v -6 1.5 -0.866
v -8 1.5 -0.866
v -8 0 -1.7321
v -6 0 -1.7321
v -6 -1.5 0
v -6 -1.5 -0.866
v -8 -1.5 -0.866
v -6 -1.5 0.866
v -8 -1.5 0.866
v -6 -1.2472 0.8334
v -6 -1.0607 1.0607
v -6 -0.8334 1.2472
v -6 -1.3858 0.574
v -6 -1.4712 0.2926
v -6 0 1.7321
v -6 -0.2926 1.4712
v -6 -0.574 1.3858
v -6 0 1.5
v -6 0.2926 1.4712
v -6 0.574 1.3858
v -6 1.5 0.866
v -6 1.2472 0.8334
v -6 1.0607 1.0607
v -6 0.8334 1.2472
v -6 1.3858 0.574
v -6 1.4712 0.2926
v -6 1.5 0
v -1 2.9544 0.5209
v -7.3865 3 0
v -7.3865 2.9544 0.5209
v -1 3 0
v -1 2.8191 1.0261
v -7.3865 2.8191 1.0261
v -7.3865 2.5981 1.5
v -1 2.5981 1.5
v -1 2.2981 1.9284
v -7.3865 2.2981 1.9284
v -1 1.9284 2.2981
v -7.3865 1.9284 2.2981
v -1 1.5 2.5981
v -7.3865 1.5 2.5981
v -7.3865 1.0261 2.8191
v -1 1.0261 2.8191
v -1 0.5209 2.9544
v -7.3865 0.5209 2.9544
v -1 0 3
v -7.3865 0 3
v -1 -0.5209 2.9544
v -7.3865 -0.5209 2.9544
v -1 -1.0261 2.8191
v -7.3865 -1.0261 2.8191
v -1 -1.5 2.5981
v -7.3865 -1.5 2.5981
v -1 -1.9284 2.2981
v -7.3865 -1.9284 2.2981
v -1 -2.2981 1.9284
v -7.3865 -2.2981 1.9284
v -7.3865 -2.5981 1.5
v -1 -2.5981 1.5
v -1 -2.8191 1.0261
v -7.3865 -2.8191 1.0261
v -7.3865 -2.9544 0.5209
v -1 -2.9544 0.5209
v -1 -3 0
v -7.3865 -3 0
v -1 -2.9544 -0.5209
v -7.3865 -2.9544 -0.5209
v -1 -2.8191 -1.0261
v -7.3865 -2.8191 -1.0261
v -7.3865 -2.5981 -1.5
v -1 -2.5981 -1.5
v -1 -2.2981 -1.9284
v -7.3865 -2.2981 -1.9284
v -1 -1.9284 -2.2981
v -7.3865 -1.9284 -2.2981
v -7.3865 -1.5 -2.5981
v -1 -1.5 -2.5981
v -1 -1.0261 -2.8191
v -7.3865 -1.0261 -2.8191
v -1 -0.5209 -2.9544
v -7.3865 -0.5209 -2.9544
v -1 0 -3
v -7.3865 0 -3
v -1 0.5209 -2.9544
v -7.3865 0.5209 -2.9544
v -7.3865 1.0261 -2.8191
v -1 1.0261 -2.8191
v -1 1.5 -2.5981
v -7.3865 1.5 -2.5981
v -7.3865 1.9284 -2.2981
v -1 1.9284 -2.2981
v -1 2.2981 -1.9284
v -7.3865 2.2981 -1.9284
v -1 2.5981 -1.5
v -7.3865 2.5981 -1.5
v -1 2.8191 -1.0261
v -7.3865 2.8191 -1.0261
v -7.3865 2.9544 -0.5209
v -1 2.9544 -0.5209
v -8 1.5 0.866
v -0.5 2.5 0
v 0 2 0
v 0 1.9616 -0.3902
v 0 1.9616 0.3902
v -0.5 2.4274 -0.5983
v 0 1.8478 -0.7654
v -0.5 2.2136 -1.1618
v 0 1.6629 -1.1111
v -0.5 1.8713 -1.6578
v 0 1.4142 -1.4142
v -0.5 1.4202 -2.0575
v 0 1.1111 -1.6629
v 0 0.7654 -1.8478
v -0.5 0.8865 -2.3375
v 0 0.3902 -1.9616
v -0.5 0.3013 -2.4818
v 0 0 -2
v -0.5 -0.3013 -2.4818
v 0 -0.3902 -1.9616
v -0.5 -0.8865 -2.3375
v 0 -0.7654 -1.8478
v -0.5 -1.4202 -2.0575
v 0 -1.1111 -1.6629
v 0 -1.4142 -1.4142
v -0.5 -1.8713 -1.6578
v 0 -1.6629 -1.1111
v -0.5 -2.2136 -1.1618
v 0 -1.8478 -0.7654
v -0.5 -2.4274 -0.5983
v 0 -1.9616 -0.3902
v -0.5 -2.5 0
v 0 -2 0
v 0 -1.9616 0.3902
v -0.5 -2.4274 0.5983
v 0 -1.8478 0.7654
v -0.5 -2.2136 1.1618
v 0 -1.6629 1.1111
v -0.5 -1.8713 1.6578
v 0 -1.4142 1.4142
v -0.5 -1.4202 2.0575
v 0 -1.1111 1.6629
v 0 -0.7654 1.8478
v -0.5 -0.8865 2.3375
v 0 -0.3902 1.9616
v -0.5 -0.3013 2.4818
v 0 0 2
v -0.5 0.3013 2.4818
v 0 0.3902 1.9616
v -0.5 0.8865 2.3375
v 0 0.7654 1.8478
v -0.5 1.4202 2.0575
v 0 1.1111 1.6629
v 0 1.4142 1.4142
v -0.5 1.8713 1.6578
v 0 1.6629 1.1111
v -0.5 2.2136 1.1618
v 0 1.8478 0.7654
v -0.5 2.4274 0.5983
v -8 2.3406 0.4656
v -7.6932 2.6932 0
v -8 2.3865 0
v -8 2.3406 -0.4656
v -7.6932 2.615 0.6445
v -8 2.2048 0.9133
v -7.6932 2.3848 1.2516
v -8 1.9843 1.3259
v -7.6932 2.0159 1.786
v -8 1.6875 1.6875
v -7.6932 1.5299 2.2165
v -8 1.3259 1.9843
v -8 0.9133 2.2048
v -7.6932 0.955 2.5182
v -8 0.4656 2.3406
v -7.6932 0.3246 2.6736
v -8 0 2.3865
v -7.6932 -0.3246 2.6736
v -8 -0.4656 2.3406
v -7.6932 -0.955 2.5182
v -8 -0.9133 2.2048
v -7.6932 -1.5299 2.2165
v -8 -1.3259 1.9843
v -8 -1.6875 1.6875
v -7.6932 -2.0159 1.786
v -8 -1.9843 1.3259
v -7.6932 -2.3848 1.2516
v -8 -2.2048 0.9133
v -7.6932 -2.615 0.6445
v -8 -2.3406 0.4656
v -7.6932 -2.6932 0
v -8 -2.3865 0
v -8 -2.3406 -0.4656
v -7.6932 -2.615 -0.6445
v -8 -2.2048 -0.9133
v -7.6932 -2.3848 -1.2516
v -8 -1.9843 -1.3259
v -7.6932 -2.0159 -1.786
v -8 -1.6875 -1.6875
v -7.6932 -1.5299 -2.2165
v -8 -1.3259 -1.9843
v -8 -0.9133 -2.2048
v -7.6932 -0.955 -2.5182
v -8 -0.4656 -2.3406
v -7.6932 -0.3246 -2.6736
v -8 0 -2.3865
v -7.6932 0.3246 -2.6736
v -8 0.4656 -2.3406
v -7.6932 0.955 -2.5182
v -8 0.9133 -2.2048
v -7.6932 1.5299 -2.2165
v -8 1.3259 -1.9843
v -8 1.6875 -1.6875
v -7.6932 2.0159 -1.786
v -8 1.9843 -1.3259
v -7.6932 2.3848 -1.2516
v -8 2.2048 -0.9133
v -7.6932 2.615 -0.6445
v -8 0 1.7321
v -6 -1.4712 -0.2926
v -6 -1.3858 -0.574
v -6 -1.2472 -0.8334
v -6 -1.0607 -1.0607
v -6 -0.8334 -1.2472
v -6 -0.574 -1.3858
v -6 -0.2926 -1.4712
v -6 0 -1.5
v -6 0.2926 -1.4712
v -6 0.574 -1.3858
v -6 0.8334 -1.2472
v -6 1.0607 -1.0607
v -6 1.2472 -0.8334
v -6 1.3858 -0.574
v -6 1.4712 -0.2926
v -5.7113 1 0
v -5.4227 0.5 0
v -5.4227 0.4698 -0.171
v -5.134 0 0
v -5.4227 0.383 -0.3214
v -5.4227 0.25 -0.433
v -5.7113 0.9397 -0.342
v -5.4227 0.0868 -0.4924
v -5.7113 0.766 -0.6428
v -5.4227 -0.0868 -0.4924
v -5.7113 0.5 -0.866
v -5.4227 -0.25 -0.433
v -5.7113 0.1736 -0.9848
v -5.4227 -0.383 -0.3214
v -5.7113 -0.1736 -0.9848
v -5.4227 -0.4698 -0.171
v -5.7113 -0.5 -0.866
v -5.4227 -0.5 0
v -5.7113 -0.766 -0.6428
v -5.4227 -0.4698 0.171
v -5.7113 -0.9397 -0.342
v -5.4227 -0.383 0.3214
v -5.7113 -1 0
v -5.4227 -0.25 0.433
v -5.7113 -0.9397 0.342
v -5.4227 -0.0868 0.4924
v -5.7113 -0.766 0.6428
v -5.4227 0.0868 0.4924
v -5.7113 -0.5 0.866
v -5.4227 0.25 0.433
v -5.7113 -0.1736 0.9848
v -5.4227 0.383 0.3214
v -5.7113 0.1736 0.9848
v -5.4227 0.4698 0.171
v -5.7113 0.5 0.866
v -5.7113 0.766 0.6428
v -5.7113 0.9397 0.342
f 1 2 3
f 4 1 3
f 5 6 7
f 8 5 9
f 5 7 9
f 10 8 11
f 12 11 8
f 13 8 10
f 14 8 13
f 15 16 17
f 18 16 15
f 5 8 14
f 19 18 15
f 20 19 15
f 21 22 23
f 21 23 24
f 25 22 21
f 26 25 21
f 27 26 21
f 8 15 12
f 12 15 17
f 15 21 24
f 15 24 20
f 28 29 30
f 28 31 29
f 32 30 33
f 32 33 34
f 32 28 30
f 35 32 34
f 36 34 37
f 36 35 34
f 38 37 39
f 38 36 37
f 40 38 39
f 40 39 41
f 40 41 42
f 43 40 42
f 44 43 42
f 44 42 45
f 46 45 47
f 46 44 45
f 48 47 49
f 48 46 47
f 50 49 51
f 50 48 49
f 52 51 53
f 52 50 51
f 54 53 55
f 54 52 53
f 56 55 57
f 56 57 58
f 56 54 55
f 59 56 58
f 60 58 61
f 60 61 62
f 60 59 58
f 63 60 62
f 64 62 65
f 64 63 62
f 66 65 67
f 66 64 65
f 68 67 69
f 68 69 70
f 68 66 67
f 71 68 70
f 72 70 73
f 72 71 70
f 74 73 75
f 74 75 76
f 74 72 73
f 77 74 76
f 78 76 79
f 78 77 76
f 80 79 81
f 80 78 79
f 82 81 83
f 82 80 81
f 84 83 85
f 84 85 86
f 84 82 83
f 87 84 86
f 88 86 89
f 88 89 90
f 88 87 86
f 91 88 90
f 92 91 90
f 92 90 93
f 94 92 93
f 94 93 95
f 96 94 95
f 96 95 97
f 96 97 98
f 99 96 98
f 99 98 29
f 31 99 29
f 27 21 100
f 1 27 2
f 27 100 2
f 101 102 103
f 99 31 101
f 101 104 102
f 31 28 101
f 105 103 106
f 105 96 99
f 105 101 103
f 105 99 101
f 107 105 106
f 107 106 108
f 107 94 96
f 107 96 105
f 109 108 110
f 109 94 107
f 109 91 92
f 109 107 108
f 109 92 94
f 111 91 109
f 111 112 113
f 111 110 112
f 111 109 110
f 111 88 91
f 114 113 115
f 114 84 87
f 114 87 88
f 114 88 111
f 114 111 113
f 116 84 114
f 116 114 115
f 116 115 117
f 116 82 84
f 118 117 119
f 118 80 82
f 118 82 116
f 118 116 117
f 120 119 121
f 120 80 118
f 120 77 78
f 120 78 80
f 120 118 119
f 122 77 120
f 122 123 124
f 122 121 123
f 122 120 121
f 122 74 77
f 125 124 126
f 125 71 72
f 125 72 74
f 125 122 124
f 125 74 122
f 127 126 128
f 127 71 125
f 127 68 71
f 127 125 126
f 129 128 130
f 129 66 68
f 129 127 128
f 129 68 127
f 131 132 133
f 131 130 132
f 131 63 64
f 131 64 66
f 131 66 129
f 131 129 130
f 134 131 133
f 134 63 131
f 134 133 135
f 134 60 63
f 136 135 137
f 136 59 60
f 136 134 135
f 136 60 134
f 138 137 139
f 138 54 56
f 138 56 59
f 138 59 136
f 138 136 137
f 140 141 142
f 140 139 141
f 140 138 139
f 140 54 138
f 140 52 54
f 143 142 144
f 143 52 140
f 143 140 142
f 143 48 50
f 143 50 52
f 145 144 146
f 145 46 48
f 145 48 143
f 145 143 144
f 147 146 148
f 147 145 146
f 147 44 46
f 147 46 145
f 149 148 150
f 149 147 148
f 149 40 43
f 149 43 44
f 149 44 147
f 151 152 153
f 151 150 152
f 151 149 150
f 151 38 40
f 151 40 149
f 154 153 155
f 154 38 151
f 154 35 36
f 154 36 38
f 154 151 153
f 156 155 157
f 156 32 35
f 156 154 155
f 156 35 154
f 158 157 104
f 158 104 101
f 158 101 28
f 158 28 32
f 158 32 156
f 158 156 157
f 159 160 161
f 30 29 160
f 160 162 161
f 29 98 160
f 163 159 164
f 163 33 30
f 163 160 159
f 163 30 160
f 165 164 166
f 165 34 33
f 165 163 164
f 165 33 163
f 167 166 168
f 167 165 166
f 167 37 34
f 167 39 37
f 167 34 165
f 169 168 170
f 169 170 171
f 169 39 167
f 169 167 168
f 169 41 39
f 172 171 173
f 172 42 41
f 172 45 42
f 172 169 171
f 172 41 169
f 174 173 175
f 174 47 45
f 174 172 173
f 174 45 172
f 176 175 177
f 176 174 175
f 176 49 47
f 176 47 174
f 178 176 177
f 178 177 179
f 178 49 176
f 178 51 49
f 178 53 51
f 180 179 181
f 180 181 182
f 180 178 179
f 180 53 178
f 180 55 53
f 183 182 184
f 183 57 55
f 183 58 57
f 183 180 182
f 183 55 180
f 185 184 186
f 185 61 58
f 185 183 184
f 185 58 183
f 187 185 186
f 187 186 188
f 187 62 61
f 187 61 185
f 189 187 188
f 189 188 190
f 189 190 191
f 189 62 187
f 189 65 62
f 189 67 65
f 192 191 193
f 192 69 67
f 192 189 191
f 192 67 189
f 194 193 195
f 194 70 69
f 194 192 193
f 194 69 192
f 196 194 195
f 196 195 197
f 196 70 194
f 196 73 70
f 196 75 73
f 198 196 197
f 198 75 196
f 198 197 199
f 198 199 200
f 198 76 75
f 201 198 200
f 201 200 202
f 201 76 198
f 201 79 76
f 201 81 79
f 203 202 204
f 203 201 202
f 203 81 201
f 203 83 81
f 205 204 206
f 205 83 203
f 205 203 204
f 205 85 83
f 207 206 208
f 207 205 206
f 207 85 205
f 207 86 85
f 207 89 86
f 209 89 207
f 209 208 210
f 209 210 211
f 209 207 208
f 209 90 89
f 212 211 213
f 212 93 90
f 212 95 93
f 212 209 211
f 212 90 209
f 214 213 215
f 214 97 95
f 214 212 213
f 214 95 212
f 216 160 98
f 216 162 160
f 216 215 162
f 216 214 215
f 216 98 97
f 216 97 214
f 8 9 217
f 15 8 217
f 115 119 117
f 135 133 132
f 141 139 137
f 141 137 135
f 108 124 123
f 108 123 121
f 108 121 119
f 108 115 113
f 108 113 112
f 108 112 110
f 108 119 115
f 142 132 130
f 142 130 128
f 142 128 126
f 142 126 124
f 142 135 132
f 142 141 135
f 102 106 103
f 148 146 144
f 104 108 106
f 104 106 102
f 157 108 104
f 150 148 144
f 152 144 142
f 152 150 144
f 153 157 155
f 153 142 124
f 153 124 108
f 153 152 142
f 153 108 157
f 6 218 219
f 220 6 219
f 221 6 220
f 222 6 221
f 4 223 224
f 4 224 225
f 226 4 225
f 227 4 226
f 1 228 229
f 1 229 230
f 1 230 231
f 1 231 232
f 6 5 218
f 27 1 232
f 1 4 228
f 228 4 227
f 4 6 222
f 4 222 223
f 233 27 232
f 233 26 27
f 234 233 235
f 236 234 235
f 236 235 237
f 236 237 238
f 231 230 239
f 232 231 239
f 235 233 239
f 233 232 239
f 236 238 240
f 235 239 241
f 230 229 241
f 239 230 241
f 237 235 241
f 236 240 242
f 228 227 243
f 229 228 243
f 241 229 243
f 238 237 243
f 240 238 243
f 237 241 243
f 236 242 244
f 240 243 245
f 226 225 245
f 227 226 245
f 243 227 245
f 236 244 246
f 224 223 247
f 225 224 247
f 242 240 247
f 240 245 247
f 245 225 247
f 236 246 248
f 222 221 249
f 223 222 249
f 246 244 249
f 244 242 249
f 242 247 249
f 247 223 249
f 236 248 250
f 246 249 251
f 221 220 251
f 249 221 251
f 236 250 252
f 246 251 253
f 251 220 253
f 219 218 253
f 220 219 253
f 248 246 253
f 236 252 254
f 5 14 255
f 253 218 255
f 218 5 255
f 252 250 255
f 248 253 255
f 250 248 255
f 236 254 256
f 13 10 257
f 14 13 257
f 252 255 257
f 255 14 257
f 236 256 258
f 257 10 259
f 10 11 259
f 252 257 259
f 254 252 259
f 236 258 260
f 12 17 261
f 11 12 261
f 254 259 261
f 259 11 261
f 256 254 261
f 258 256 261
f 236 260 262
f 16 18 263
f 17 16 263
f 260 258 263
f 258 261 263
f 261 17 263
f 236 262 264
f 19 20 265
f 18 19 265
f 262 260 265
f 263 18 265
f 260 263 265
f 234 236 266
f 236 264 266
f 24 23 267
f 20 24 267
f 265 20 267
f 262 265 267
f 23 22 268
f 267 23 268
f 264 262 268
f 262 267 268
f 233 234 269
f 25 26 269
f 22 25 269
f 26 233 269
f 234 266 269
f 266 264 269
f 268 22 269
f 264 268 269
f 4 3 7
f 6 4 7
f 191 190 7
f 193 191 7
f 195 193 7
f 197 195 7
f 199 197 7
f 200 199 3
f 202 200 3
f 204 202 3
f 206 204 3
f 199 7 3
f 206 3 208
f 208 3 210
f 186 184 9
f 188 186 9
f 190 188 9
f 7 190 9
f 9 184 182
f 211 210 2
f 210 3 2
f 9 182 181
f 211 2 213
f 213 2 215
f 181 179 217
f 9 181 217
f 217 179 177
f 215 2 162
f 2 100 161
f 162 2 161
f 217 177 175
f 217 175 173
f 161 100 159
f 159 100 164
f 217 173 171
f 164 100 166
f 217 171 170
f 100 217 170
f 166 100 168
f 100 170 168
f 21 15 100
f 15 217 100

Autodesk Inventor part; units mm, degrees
sketch "Sketch_1" plane through (0, 0, 0) normal (0, 0, 1) x (1, 0, 0)
  line L0 (0, 0) -> (-8, 0)
  line L1 (-8, 0) -> (-8, 2.3865)
  line L2 (-8, 2.3865) -> (-7.3865, 3)
  line L3 (-7.3865, 3) -> (-1, 3)
  line L4 (-1, 3) -> (0, 2)
  line L5 (0, 2) -> (0, 0)
  line L6 (0, 0) -> (-8, 0)
revolve "Revolution1" add sketch "Sketch_1" angle 360 about axis through (0, 0, 0) along (1, 0, 0)
thread "Thread1" size "M6x1" class "6g" standard "ISO Metric profile" full length
sketch "Sketch_2" plane through (-8, 0, 0) normal (-1, 0, 0) x (0, 1, 0)
  line L0 (-1.5, -0.866) -> (0, -1.7321)
  line L1 (0, -1.7321) -> (1.5, -0.866)
  line L2 (1.5, -0.866) -> (1.5, 0.866)
  line L3 (1.5, 0.866) -> (0, 1.7321)
  line L4 (0, 1.7321) -> (-1.5, 0.866)
  line L5 (-1.5, 0.866) -> (-1.5, -0.866)
extrude "Extrusion1" cut sketch "Sketch_2" against normal blind 2
sketch "Sketch_3" plane through (0, 0, 0) normal (0, 0, 1) x (1, 0, 0)
  line L0 (-5.134, 0) -> (-6, 0)
  line L1 (-6, 0) -> (-6, 1.5)
  line L2 (-6, 1.5) -> (-5.134, 0)
  line L3 (-5.134, 0) -> (-6, 0)
revolve "Revolution2" cut sketch "Sketch_3" angle 360 about axis through (-5.134, 0, 0) along (1, 0, 0)
ref_plane "CP_XY" through (0, 0, 0) normal (1, 0, 0) x (0, 0, -1)
ref_plane "CP_YZ" through (0, 0, 0) normal (0, 0, -1) x (0, 1, 0)
ref_plane "CP_ZX" through (0, 0, 0) normal (0, 1, 0) x (1, 0, 0)
properties part number "SET-SCREW6-8"
